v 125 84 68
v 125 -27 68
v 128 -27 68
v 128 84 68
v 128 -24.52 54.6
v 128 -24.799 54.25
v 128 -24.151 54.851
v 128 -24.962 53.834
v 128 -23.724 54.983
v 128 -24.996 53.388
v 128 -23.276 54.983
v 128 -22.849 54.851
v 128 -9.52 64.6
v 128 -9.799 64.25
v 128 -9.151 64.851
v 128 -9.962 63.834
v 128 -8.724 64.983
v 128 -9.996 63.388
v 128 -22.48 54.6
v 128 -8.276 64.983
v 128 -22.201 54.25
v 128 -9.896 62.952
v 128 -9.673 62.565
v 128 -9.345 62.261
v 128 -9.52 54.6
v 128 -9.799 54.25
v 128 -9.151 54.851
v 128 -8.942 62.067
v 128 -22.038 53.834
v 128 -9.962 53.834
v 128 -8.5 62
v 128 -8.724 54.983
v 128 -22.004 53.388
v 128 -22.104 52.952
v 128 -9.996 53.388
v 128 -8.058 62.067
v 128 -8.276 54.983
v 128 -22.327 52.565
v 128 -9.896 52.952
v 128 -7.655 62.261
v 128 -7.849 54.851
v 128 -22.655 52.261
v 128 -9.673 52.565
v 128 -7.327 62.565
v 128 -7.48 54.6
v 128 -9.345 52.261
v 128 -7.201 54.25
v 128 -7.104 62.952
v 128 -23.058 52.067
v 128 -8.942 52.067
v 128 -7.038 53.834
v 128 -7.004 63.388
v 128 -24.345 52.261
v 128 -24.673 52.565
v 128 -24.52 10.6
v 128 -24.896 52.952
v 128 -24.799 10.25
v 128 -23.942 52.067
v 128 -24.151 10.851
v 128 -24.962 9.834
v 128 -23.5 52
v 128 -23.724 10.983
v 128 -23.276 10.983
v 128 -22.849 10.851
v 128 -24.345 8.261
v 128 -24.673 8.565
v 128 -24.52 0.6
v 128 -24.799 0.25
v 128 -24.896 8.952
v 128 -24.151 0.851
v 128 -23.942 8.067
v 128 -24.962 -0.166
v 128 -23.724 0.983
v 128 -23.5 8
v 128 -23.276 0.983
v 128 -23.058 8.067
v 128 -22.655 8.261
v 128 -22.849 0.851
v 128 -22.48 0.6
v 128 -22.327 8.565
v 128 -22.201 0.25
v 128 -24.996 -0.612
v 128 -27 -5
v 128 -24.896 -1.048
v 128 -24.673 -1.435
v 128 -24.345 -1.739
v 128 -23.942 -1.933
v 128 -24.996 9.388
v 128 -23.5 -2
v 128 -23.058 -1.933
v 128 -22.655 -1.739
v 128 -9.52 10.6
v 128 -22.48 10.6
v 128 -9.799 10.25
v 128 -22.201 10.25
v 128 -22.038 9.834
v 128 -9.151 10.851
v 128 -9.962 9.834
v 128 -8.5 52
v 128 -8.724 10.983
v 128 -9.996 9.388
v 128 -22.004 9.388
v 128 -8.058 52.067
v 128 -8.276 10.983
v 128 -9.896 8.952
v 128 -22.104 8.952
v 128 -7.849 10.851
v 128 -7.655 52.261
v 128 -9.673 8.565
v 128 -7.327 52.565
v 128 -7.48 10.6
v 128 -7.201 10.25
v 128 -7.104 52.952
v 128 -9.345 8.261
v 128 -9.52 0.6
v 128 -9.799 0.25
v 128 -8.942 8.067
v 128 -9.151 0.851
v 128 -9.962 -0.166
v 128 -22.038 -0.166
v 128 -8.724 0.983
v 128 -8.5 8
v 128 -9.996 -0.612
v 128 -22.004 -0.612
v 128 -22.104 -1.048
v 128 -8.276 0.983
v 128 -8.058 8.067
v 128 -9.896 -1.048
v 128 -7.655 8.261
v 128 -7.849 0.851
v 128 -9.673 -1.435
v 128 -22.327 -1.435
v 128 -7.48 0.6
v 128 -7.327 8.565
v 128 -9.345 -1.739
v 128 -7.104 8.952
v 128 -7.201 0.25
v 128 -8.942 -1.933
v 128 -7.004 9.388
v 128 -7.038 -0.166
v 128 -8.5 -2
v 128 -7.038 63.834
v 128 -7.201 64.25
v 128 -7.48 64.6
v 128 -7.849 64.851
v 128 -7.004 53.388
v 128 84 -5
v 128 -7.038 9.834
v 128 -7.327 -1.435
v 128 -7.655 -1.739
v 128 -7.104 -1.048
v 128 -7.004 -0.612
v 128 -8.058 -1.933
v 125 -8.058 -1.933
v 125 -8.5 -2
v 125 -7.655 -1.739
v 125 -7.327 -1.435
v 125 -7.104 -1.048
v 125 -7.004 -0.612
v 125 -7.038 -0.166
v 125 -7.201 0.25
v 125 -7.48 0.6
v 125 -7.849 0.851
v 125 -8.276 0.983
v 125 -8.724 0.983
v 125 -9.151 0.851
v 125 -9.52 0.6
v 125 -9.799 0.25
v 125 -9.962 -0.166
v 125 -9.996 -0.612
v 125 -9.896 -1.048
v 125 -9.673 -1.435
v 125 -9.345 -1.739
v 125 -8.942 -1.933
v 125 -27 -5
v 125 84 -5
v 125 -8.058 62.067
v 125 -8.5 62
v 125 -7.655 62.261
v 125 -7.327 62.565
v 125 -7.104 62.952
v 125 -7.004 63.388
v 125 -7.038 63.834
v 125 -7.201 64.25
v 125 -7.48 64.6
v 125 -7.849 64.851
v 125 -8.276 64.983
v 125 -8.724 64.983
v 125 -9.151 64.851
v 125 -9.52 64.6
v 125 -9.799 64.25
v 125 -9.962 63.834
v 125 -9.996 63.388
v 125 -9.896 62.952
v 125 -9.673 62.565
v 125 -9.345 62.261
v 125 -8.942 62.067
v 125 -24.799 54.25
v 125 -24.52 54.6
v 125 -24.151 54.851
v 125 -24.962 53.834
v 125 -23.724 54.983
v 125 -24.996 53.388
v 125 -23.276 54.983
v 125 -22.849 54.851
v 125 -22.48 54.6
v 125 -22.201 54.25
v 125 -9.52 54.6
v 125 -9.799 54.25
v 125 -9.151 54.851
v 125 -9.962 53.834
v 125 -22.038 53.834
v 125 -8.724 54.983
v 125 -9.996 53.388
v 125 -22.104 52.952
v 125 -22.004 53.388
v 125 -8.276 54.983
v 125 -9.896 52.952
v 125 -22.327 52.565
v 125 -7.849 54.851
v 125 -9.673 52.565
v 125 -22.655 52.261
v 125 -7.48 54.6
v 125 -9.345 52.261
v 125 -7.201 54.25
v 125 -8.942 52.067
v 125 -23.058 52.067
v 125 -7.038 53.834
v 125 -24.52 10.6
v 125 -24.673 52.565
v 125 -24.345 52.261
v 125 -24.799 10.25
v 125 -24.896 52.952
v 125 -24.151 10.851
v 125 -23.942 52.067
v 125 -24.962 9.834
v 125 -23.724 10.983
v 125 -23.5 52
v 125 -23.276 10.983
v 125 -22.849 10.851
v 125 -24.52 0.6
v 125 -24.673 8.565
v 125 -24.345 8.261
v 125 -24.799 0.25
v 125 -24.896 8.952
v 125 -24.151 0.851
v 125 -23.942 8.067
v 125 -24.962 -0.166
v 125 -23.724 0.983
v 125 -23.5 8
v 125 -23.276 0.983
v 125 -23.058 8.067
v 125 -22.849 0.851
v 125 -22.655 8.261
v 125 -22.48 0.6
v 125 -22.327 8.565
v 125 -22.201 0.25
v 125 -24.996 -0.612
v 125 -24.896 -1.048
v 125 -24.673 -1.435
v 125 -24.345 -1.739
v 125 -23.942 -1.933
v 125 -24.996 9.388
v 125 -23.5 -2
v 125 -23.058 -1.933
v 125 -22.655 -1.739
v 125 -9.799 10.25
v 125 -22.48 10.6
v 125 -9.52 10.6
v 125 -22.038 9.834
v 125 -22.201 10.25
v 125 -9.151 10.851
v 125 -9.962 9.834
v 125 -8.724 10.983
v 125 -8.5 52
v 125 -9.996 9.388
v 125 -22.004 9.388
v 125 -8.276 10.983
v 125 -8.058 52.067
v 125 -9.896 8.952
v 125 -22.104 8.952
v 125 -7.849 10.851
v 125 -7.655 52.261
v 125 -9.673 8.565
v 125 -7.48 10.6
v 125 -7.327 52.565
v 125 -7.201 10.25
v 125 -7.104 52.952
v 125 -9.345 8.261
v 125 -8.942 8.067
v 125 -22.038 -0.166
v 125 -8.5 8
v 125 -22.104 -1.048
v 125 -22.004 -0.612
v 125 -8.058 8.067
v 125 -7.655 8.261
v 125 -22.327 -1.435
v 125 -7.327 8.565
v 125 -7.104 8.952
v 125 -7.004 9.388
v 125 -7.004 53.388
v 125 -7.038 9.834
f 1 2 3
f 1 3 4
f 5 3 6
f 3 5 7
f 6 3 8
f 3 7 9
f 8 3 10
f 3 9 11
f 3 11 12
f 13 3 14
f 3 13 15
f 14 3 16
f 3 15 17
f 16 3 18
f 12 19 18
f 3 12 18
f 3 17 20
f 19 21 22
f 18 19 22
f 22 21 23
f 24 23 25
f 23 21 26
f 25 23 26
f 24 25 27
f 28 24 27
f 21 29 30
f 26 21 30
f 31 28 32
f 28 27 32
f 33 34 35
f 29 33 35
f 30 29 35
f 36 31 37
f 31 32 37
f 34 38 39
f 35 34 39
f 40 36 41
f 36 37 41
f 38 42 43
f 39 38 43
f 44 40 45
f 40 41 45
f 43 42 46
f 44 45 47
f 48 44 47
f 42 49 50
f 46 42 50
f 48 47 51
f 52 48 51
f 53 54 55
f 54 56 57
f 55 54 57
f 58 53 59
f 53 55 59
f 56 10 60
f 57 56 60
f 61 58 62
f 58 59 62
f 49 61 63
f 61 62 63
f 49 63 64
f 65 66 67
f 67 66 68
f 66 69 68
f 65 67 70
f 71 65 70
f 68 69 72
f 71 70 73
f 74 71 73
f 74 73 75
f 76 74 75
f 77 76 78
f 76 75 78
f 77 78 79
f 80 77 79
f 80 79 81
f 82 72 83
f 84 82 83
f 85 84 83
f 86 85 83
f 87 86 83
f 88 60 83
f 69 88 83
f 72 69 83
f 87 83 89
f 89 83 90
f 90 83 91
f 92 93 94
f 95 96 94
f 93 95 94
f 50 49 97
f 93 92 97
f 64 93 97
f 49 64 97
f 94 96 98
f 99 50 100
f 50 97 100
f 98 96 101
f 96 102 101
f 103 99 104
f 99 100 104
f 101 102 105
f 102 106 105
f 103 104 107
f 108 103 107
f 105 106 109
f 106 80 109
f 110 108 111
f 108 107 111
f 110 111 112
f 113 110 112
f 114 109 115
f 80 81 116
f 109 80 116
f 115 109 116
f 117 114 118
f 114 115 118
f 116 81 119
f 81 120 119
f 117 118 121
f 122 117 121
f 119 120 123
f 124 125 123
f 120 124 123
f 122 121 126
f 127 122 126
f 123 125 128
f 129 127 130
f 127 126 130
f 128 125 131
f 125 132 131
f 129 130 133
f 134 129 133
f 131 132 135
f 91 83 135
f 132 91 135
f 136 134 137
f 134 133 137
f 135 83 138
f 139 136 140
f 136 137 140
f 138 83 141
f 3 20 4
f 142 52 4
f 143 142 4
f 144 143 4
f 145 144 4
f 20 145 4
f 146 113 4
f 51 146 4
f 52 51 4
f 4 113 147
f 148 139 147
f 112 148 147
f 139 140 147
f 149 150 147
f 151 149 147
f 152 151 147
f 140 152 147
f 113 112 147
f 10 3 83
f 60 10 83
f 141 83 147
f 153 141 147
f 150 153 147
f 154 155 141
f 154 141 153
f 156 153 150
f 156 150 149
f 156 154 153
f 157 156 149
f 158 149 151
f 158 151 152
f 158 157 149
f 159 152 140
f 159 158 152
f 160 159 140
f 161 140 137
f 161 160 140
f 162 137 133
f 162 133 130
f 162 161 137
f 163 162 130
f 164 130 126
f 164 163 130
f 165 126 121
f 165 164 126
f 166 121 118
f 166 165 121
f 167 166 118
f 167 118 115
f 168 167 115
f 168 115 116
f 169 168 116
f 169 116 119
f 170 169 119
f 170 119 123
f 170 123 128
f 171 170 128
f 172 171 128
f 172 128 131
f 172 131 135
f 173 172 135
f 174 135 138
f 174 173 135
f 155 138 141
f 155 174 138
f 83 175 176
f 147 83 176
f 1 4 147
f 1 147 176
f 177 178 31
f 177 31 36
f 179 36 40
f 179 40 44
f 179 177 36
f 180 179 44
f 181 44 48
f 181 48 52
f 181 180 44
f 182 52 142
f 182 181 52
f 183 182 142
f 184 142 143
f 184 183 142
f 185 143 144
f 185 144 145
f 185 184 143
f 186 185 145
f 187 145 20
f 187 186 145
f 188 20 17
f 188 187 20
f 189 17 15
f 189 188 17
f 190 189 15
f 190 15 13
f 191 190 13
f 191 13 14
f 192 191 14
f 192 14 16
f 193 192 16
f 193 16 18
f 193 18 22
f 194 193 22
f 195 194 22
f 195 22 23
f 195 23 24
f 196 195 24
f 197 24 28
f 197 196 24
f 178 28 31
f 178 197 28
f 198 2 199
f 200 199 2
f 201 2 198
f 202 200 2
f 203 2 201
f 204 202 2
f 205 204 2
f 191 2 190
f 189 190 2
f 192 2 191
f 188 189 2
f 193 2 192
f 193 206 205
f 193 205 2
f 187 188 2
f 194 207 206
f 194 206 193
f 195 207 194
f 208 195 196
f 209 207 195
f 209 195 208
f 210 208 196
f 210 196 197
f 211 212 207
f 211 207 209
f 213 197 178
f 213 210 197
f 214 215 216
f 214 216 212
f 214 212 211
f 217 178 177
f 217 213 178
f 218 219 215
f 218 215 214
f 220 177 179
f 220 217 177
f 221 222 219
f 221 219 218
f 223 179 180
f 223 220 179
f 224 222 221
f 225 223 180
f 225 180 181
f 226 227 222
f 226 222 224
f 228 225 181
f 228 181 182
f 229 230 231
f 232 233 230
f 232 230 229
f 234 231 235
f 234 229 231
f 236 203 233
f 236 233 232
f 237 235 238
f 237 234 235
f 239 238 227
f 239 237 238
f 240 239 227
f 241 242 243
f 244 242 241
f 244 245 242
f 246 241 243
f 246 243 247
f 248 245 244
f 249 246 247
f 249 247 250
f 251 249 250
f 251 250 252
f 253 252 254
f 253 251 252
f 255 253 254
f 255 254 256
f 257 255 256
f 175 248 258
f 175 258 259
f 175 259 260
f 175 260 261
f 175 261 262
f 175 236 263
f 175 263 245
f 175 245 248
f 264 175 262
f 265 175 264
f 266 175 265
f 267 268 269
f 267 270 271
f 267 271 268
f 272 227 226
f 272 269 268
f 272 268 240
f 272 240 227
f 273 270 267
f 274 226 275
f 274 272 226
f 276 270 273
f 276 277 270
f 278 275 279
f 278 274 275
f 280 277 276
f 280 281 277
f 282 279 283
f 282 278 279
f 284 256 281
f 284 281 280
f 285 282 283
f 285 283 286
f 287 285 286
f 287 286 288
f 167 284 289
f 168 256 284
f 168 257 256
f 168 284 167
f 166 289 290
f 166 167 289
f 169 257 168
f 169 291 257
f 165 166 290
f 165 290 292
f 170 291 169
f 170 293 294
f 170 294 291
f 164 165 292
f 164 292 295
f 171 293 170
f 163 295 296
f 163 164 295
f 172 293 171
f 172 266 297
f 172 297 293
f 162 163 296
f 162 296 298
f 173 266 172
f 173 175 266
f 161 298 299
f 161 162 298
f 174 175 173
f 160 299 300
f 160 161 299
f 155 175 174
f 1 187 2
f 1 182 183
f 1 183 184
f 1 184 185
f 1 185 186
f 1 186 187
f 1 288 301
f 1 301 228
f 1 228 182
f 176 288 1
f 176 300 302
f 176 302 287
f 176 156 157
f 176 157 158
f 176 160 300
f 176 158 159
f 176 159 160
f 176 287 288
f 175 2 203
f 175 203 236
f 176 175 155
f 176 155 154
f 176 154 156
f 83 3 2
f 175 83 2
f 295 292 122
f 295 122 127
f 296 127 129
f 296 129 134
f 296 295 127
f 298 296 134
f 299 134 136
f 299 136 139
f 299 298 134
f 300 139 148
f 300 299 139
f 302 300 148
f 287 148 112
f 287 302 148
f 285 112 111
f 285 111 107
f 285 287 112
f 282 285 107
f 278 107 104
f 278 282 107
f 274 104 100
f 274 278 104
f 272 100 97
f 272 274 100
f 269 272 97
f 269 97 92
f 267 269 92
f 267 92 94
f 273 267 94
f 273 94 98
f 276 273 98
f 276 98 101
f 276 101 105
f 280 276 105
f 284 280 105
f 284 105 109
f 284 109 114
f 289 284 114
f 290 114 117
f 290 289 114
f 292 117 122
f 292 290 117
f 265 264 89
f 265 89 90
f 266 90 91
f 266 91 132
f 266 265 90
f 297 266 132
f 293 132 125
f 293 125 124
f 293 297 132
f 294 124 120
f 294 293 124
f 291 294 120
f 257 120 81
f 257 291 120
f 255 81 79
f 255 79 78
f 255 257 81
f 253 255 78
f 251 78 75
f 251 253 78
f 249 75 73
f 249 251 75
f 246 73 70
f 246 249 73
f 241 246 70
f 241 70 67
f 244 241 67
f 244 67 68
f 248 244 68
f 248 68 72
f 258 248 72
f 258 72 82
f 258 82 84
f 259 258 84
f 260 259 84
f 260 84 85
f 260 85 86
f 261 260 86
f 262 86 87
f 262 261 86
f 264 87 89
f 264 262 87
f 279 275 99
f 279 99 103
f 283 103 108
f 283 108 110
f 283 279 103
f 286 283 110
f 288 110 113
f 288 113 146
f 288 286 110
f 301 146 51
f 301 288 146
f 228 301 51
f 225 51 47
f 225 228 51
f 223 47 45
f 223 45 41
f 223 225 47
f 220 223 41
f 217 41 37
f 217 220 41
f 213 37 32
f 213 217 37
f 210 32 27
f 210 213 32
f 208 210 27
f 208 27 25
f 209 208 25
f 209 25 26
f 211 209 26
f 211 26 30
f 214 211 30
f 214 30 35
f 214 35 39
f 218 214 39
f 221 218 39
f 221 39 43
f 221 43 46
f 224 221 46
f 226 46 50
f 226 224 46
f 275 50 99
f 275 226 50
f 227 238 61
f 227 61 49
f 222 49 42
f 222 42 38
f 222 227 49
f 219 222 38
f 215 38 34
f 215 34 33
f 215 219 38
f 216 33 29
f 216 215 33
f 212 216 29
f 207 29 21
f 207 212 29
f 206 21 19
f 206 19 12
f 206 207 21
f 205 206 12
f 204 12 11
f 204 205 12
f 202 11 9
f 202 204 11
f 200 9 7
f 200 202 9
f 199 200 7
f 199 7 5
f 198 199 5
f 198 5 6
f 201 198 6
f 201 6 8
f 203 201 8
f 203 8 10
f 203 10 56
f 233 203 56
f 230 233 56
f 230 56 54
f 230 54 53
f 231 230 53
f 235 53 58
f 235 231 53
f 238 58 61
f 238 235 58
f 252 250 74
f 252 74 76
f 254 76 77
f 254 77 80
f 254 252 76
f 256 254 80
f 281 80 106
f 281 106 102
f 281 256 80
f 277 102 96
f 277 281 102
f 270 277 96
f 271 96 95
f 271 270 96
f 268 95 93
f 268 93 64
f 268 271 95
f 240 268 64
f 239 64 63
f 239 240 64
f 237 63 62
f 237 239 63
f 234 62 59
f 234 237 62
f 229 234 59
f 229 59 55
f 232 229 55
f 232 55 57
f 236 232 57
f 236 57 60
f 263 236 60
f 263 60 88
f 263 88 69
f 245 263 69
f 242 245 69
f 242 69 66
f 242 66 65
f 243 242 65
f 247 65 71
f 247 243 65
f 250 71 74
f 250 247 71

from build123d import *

# Parameters (mm, degrees)
CYLINDER022_R           = 1.5
CYLINDER022_DEPTH       = 3
CYLINDER022_PITCH_ANGLE = 90
CYLINDER021_R           = 1.5
CYLINDER021_DEPTH       = 3
CYLINDER021_PITCH_ANGLE = 90
CYLINDER020_R           = 1.5
CYLINDER020_DEPTH       = 3
CYLINDER020_PITCH_ANGLE = 90
CYLINDER019_R           = 1.5
CYLINDER019_DEPTH       = 3
CYLINDER019_PITCH_ANGLE = 90
CYLINDER018_R           = 1.5
CYLINDER018_DEPTH       = 3
CYLINDER018_PITCH_ANGLE = 90
CYLINDER017_R           = 1.5
CYLINDER017_DEPTH       = 3
CYLINDER017_PITCH_ANGLE = 90
CYLINDER_R              = 1.5
CYLINDER_DEPTH          = 3
CYLINDER_PITCH_ANGLE    = 90
BOX014_W                = 111
BOX014_H                = 3
BOX014_DEPTH            = 73
BOX014_PLACEMENT_ANGLE  = 90


with BuildPart() as cylinder022:
    # Cylinder022 → Cylinder022 (new body)
    with BuildSketch(Plane.XY):
        Circle(CYLINDER022_R)
    extrude(amount=CYLINDER022_DEPTH)


with BuildPart() as cylinder022_1:
    # Cylinder022 pitch: moved
    add(cylinder022.part.rotate(Axis((0, 0, 0), (0, 1, 0)), CYLINDER022_PITCH_ANGLE))


with BuildPart() as cylinder022_2:
    # Cylinder022 placement: moved
    add(cylinder022_1.part.moved(Location((125, -8.5, 53.5))))


with BuildPart() as cylinder021:
    # Cylinder021 → Cylinder021 (new body)
    with BuildSketch(Plane.XY):
        Circle(CYLINDER021_R)
    extrude(amount=CYLINDER021_DEPTH)


with BuildPart() as cylinder021_1:
    # Cylinder021 pitch: moved
    add(cylinder021.part.rotate(Axis((0, 0, 0), (0, 1, 0)), CYLINDER021_PITCH_ANGLE))


with BuildPart() as cylinder021_2:
    # Cylinder021 placement: moved
    add(cylinder021_1.part.moved(Location((125, -23.5, 53.5))))


with BuildPart() as cylinder020:
    # Cylinder020 → Cylinder020 (new body)
    with BuildSketch(Plane.XY):
        Circle(CYLINDER020_R)
    extrude(amount=CYLINDER020_DEPTH)


with BuildPart() as cylinder020_1:
    # Cylinder020 pitch: moved
    add(cylinder020.part.rotate(Axis((0, 0, 0), (0, 1, 0)), CYLINDER020_PITCH_ANGLE))


with BuildPart() as cylinder020_2:
    # Cylinder020 placement: moved
    add(cylinder020_1.part.moved(Location((125, -8.5, 63.5))))


with BuildPart() as cylinder019:
    # Cylinder019 → Cylinder019 (new body)
    with BuildSketch(Plane.XY):
        Circle(CYLINDER019_R)
    extrude(amount=CYLINDER019_DEPTH)


with BuildPart() as cylinder019_1:
    # Cylinder019 pitch: moved
    add(cylinder019.part.rotate(Axis((0, 0, 0), (0, 1, 0)), CYLINDER019_PITCH_ANGLE))


with BuildPart() as cylinder019_2:
    # Cylinder019 placement: moved
    add(cylinder019_1.part.moved(Location((125, -23.5, -0.5))))


with BuildPart() as cylinder018:
    # Cylinder018 → Cylinder018 (new body)
    with BuildSketch(Plane.XY):
        Circle(CYLINDER018_R)
    extrude(amount=CYLINDER018_DEPTH)


with BuildPart() as cylinder018_1:
    # Cylinder018 pitch: moved
    add(cylinder018.part.rotate(Axis((0, 0, 0), (0, 1, 0)), CYLINDER018_PITCH_ANGLE))


with BuildPart() as cylinder018_2:
    # Cylinder018 placement: moved
    add(cylinder018_1.part.moved(Location((125, -23.5, 9.5))))


with BuildPart() as cylinder017:
    # Cylinder017 → Cylinder017 (new body)
    with BuildSketch(Plane.XY):
        Circle(CYLINDER017_R)
    extrude(amount=CYLINDER017_DEPTH)


with BuildPart() as cylinder017_1:
    # Cylinder017 pitch: moved
    add(cylinder017.part.rotate(Axis((0, 0, 0), (0, 1, 0)), CYLINDER017_PITCH_ANGLE))


with BuildPart() as cylinder017_2:
    # Cylinder017 placement: moved
    add(cylinder017_1.part.moved(Location((125, -8.5, 9.5))))


with BuildPart() as cylinder:
    # Cylinder → Cylinder (new body)
    with BuildSketch(Plane.XY):
        Circle(CYLINDER_R)
    extrude(amount=CYLINDER_DEPTH)


with BuildPart() as cylinder_1:
    # Cylinder pitch: moved
    add(cylinder.part.rotate(Axis((0, 0, 0), (0, 1, 0)), CYLINDER_PITCH_ANGLE))


with BuildPart() as cylinder_2:
    # Cylinder placement: moved
    add(cylinder_1.part.moved(Location((125, -8.5, -0.5))))


with BuildPart() as cut032:
    # Box014 → Box014 (new body)
    with BuildSketch(Plane.XY):
        with Locations((55.5, 1.5)):
            Rectangle(BOX014_W, BOX014_H)
    extrude(amount=BOX014_DEPTH)


with BuildPart() as cut032_1:
    # Box014 placement: moved
    add(cut032.part.moved(Location((128, -27, -5))).rotate(Axis((128, -27, -5), (0, 0, 1)), BOX014_PLACEMENT_ANGLE))

    # Cut026: cut Cylinder
    add(cylinder_2.part, mode=Mode.SUBTRACT)

    # Cut027: cut Cylinder017
    add(cylinder017_2.part, mode=Mode.SUBTRACT)

    # Cut028: cut Cylinder018
    add(cylinder018_2.part, mode=Mode.SUBTRACT)

    # Cut029: cut Cylinder019
    add(cylinder019_2.part, mode=Mode.SUBTRACT)

    # Cut030: cut Cylinder020
    add(cylinder020_2.part, mode=Mode.SUBTRACT)

    # Cut031: cut Cylinder021
    add(cylinder021_2.part, mode=Mode.SUBTRACT)

    # Cut032: cut Cylinder022
    add(cylinder022_2.part, mode=Mode.SUBTRACT)


solid = cut032_1.part
